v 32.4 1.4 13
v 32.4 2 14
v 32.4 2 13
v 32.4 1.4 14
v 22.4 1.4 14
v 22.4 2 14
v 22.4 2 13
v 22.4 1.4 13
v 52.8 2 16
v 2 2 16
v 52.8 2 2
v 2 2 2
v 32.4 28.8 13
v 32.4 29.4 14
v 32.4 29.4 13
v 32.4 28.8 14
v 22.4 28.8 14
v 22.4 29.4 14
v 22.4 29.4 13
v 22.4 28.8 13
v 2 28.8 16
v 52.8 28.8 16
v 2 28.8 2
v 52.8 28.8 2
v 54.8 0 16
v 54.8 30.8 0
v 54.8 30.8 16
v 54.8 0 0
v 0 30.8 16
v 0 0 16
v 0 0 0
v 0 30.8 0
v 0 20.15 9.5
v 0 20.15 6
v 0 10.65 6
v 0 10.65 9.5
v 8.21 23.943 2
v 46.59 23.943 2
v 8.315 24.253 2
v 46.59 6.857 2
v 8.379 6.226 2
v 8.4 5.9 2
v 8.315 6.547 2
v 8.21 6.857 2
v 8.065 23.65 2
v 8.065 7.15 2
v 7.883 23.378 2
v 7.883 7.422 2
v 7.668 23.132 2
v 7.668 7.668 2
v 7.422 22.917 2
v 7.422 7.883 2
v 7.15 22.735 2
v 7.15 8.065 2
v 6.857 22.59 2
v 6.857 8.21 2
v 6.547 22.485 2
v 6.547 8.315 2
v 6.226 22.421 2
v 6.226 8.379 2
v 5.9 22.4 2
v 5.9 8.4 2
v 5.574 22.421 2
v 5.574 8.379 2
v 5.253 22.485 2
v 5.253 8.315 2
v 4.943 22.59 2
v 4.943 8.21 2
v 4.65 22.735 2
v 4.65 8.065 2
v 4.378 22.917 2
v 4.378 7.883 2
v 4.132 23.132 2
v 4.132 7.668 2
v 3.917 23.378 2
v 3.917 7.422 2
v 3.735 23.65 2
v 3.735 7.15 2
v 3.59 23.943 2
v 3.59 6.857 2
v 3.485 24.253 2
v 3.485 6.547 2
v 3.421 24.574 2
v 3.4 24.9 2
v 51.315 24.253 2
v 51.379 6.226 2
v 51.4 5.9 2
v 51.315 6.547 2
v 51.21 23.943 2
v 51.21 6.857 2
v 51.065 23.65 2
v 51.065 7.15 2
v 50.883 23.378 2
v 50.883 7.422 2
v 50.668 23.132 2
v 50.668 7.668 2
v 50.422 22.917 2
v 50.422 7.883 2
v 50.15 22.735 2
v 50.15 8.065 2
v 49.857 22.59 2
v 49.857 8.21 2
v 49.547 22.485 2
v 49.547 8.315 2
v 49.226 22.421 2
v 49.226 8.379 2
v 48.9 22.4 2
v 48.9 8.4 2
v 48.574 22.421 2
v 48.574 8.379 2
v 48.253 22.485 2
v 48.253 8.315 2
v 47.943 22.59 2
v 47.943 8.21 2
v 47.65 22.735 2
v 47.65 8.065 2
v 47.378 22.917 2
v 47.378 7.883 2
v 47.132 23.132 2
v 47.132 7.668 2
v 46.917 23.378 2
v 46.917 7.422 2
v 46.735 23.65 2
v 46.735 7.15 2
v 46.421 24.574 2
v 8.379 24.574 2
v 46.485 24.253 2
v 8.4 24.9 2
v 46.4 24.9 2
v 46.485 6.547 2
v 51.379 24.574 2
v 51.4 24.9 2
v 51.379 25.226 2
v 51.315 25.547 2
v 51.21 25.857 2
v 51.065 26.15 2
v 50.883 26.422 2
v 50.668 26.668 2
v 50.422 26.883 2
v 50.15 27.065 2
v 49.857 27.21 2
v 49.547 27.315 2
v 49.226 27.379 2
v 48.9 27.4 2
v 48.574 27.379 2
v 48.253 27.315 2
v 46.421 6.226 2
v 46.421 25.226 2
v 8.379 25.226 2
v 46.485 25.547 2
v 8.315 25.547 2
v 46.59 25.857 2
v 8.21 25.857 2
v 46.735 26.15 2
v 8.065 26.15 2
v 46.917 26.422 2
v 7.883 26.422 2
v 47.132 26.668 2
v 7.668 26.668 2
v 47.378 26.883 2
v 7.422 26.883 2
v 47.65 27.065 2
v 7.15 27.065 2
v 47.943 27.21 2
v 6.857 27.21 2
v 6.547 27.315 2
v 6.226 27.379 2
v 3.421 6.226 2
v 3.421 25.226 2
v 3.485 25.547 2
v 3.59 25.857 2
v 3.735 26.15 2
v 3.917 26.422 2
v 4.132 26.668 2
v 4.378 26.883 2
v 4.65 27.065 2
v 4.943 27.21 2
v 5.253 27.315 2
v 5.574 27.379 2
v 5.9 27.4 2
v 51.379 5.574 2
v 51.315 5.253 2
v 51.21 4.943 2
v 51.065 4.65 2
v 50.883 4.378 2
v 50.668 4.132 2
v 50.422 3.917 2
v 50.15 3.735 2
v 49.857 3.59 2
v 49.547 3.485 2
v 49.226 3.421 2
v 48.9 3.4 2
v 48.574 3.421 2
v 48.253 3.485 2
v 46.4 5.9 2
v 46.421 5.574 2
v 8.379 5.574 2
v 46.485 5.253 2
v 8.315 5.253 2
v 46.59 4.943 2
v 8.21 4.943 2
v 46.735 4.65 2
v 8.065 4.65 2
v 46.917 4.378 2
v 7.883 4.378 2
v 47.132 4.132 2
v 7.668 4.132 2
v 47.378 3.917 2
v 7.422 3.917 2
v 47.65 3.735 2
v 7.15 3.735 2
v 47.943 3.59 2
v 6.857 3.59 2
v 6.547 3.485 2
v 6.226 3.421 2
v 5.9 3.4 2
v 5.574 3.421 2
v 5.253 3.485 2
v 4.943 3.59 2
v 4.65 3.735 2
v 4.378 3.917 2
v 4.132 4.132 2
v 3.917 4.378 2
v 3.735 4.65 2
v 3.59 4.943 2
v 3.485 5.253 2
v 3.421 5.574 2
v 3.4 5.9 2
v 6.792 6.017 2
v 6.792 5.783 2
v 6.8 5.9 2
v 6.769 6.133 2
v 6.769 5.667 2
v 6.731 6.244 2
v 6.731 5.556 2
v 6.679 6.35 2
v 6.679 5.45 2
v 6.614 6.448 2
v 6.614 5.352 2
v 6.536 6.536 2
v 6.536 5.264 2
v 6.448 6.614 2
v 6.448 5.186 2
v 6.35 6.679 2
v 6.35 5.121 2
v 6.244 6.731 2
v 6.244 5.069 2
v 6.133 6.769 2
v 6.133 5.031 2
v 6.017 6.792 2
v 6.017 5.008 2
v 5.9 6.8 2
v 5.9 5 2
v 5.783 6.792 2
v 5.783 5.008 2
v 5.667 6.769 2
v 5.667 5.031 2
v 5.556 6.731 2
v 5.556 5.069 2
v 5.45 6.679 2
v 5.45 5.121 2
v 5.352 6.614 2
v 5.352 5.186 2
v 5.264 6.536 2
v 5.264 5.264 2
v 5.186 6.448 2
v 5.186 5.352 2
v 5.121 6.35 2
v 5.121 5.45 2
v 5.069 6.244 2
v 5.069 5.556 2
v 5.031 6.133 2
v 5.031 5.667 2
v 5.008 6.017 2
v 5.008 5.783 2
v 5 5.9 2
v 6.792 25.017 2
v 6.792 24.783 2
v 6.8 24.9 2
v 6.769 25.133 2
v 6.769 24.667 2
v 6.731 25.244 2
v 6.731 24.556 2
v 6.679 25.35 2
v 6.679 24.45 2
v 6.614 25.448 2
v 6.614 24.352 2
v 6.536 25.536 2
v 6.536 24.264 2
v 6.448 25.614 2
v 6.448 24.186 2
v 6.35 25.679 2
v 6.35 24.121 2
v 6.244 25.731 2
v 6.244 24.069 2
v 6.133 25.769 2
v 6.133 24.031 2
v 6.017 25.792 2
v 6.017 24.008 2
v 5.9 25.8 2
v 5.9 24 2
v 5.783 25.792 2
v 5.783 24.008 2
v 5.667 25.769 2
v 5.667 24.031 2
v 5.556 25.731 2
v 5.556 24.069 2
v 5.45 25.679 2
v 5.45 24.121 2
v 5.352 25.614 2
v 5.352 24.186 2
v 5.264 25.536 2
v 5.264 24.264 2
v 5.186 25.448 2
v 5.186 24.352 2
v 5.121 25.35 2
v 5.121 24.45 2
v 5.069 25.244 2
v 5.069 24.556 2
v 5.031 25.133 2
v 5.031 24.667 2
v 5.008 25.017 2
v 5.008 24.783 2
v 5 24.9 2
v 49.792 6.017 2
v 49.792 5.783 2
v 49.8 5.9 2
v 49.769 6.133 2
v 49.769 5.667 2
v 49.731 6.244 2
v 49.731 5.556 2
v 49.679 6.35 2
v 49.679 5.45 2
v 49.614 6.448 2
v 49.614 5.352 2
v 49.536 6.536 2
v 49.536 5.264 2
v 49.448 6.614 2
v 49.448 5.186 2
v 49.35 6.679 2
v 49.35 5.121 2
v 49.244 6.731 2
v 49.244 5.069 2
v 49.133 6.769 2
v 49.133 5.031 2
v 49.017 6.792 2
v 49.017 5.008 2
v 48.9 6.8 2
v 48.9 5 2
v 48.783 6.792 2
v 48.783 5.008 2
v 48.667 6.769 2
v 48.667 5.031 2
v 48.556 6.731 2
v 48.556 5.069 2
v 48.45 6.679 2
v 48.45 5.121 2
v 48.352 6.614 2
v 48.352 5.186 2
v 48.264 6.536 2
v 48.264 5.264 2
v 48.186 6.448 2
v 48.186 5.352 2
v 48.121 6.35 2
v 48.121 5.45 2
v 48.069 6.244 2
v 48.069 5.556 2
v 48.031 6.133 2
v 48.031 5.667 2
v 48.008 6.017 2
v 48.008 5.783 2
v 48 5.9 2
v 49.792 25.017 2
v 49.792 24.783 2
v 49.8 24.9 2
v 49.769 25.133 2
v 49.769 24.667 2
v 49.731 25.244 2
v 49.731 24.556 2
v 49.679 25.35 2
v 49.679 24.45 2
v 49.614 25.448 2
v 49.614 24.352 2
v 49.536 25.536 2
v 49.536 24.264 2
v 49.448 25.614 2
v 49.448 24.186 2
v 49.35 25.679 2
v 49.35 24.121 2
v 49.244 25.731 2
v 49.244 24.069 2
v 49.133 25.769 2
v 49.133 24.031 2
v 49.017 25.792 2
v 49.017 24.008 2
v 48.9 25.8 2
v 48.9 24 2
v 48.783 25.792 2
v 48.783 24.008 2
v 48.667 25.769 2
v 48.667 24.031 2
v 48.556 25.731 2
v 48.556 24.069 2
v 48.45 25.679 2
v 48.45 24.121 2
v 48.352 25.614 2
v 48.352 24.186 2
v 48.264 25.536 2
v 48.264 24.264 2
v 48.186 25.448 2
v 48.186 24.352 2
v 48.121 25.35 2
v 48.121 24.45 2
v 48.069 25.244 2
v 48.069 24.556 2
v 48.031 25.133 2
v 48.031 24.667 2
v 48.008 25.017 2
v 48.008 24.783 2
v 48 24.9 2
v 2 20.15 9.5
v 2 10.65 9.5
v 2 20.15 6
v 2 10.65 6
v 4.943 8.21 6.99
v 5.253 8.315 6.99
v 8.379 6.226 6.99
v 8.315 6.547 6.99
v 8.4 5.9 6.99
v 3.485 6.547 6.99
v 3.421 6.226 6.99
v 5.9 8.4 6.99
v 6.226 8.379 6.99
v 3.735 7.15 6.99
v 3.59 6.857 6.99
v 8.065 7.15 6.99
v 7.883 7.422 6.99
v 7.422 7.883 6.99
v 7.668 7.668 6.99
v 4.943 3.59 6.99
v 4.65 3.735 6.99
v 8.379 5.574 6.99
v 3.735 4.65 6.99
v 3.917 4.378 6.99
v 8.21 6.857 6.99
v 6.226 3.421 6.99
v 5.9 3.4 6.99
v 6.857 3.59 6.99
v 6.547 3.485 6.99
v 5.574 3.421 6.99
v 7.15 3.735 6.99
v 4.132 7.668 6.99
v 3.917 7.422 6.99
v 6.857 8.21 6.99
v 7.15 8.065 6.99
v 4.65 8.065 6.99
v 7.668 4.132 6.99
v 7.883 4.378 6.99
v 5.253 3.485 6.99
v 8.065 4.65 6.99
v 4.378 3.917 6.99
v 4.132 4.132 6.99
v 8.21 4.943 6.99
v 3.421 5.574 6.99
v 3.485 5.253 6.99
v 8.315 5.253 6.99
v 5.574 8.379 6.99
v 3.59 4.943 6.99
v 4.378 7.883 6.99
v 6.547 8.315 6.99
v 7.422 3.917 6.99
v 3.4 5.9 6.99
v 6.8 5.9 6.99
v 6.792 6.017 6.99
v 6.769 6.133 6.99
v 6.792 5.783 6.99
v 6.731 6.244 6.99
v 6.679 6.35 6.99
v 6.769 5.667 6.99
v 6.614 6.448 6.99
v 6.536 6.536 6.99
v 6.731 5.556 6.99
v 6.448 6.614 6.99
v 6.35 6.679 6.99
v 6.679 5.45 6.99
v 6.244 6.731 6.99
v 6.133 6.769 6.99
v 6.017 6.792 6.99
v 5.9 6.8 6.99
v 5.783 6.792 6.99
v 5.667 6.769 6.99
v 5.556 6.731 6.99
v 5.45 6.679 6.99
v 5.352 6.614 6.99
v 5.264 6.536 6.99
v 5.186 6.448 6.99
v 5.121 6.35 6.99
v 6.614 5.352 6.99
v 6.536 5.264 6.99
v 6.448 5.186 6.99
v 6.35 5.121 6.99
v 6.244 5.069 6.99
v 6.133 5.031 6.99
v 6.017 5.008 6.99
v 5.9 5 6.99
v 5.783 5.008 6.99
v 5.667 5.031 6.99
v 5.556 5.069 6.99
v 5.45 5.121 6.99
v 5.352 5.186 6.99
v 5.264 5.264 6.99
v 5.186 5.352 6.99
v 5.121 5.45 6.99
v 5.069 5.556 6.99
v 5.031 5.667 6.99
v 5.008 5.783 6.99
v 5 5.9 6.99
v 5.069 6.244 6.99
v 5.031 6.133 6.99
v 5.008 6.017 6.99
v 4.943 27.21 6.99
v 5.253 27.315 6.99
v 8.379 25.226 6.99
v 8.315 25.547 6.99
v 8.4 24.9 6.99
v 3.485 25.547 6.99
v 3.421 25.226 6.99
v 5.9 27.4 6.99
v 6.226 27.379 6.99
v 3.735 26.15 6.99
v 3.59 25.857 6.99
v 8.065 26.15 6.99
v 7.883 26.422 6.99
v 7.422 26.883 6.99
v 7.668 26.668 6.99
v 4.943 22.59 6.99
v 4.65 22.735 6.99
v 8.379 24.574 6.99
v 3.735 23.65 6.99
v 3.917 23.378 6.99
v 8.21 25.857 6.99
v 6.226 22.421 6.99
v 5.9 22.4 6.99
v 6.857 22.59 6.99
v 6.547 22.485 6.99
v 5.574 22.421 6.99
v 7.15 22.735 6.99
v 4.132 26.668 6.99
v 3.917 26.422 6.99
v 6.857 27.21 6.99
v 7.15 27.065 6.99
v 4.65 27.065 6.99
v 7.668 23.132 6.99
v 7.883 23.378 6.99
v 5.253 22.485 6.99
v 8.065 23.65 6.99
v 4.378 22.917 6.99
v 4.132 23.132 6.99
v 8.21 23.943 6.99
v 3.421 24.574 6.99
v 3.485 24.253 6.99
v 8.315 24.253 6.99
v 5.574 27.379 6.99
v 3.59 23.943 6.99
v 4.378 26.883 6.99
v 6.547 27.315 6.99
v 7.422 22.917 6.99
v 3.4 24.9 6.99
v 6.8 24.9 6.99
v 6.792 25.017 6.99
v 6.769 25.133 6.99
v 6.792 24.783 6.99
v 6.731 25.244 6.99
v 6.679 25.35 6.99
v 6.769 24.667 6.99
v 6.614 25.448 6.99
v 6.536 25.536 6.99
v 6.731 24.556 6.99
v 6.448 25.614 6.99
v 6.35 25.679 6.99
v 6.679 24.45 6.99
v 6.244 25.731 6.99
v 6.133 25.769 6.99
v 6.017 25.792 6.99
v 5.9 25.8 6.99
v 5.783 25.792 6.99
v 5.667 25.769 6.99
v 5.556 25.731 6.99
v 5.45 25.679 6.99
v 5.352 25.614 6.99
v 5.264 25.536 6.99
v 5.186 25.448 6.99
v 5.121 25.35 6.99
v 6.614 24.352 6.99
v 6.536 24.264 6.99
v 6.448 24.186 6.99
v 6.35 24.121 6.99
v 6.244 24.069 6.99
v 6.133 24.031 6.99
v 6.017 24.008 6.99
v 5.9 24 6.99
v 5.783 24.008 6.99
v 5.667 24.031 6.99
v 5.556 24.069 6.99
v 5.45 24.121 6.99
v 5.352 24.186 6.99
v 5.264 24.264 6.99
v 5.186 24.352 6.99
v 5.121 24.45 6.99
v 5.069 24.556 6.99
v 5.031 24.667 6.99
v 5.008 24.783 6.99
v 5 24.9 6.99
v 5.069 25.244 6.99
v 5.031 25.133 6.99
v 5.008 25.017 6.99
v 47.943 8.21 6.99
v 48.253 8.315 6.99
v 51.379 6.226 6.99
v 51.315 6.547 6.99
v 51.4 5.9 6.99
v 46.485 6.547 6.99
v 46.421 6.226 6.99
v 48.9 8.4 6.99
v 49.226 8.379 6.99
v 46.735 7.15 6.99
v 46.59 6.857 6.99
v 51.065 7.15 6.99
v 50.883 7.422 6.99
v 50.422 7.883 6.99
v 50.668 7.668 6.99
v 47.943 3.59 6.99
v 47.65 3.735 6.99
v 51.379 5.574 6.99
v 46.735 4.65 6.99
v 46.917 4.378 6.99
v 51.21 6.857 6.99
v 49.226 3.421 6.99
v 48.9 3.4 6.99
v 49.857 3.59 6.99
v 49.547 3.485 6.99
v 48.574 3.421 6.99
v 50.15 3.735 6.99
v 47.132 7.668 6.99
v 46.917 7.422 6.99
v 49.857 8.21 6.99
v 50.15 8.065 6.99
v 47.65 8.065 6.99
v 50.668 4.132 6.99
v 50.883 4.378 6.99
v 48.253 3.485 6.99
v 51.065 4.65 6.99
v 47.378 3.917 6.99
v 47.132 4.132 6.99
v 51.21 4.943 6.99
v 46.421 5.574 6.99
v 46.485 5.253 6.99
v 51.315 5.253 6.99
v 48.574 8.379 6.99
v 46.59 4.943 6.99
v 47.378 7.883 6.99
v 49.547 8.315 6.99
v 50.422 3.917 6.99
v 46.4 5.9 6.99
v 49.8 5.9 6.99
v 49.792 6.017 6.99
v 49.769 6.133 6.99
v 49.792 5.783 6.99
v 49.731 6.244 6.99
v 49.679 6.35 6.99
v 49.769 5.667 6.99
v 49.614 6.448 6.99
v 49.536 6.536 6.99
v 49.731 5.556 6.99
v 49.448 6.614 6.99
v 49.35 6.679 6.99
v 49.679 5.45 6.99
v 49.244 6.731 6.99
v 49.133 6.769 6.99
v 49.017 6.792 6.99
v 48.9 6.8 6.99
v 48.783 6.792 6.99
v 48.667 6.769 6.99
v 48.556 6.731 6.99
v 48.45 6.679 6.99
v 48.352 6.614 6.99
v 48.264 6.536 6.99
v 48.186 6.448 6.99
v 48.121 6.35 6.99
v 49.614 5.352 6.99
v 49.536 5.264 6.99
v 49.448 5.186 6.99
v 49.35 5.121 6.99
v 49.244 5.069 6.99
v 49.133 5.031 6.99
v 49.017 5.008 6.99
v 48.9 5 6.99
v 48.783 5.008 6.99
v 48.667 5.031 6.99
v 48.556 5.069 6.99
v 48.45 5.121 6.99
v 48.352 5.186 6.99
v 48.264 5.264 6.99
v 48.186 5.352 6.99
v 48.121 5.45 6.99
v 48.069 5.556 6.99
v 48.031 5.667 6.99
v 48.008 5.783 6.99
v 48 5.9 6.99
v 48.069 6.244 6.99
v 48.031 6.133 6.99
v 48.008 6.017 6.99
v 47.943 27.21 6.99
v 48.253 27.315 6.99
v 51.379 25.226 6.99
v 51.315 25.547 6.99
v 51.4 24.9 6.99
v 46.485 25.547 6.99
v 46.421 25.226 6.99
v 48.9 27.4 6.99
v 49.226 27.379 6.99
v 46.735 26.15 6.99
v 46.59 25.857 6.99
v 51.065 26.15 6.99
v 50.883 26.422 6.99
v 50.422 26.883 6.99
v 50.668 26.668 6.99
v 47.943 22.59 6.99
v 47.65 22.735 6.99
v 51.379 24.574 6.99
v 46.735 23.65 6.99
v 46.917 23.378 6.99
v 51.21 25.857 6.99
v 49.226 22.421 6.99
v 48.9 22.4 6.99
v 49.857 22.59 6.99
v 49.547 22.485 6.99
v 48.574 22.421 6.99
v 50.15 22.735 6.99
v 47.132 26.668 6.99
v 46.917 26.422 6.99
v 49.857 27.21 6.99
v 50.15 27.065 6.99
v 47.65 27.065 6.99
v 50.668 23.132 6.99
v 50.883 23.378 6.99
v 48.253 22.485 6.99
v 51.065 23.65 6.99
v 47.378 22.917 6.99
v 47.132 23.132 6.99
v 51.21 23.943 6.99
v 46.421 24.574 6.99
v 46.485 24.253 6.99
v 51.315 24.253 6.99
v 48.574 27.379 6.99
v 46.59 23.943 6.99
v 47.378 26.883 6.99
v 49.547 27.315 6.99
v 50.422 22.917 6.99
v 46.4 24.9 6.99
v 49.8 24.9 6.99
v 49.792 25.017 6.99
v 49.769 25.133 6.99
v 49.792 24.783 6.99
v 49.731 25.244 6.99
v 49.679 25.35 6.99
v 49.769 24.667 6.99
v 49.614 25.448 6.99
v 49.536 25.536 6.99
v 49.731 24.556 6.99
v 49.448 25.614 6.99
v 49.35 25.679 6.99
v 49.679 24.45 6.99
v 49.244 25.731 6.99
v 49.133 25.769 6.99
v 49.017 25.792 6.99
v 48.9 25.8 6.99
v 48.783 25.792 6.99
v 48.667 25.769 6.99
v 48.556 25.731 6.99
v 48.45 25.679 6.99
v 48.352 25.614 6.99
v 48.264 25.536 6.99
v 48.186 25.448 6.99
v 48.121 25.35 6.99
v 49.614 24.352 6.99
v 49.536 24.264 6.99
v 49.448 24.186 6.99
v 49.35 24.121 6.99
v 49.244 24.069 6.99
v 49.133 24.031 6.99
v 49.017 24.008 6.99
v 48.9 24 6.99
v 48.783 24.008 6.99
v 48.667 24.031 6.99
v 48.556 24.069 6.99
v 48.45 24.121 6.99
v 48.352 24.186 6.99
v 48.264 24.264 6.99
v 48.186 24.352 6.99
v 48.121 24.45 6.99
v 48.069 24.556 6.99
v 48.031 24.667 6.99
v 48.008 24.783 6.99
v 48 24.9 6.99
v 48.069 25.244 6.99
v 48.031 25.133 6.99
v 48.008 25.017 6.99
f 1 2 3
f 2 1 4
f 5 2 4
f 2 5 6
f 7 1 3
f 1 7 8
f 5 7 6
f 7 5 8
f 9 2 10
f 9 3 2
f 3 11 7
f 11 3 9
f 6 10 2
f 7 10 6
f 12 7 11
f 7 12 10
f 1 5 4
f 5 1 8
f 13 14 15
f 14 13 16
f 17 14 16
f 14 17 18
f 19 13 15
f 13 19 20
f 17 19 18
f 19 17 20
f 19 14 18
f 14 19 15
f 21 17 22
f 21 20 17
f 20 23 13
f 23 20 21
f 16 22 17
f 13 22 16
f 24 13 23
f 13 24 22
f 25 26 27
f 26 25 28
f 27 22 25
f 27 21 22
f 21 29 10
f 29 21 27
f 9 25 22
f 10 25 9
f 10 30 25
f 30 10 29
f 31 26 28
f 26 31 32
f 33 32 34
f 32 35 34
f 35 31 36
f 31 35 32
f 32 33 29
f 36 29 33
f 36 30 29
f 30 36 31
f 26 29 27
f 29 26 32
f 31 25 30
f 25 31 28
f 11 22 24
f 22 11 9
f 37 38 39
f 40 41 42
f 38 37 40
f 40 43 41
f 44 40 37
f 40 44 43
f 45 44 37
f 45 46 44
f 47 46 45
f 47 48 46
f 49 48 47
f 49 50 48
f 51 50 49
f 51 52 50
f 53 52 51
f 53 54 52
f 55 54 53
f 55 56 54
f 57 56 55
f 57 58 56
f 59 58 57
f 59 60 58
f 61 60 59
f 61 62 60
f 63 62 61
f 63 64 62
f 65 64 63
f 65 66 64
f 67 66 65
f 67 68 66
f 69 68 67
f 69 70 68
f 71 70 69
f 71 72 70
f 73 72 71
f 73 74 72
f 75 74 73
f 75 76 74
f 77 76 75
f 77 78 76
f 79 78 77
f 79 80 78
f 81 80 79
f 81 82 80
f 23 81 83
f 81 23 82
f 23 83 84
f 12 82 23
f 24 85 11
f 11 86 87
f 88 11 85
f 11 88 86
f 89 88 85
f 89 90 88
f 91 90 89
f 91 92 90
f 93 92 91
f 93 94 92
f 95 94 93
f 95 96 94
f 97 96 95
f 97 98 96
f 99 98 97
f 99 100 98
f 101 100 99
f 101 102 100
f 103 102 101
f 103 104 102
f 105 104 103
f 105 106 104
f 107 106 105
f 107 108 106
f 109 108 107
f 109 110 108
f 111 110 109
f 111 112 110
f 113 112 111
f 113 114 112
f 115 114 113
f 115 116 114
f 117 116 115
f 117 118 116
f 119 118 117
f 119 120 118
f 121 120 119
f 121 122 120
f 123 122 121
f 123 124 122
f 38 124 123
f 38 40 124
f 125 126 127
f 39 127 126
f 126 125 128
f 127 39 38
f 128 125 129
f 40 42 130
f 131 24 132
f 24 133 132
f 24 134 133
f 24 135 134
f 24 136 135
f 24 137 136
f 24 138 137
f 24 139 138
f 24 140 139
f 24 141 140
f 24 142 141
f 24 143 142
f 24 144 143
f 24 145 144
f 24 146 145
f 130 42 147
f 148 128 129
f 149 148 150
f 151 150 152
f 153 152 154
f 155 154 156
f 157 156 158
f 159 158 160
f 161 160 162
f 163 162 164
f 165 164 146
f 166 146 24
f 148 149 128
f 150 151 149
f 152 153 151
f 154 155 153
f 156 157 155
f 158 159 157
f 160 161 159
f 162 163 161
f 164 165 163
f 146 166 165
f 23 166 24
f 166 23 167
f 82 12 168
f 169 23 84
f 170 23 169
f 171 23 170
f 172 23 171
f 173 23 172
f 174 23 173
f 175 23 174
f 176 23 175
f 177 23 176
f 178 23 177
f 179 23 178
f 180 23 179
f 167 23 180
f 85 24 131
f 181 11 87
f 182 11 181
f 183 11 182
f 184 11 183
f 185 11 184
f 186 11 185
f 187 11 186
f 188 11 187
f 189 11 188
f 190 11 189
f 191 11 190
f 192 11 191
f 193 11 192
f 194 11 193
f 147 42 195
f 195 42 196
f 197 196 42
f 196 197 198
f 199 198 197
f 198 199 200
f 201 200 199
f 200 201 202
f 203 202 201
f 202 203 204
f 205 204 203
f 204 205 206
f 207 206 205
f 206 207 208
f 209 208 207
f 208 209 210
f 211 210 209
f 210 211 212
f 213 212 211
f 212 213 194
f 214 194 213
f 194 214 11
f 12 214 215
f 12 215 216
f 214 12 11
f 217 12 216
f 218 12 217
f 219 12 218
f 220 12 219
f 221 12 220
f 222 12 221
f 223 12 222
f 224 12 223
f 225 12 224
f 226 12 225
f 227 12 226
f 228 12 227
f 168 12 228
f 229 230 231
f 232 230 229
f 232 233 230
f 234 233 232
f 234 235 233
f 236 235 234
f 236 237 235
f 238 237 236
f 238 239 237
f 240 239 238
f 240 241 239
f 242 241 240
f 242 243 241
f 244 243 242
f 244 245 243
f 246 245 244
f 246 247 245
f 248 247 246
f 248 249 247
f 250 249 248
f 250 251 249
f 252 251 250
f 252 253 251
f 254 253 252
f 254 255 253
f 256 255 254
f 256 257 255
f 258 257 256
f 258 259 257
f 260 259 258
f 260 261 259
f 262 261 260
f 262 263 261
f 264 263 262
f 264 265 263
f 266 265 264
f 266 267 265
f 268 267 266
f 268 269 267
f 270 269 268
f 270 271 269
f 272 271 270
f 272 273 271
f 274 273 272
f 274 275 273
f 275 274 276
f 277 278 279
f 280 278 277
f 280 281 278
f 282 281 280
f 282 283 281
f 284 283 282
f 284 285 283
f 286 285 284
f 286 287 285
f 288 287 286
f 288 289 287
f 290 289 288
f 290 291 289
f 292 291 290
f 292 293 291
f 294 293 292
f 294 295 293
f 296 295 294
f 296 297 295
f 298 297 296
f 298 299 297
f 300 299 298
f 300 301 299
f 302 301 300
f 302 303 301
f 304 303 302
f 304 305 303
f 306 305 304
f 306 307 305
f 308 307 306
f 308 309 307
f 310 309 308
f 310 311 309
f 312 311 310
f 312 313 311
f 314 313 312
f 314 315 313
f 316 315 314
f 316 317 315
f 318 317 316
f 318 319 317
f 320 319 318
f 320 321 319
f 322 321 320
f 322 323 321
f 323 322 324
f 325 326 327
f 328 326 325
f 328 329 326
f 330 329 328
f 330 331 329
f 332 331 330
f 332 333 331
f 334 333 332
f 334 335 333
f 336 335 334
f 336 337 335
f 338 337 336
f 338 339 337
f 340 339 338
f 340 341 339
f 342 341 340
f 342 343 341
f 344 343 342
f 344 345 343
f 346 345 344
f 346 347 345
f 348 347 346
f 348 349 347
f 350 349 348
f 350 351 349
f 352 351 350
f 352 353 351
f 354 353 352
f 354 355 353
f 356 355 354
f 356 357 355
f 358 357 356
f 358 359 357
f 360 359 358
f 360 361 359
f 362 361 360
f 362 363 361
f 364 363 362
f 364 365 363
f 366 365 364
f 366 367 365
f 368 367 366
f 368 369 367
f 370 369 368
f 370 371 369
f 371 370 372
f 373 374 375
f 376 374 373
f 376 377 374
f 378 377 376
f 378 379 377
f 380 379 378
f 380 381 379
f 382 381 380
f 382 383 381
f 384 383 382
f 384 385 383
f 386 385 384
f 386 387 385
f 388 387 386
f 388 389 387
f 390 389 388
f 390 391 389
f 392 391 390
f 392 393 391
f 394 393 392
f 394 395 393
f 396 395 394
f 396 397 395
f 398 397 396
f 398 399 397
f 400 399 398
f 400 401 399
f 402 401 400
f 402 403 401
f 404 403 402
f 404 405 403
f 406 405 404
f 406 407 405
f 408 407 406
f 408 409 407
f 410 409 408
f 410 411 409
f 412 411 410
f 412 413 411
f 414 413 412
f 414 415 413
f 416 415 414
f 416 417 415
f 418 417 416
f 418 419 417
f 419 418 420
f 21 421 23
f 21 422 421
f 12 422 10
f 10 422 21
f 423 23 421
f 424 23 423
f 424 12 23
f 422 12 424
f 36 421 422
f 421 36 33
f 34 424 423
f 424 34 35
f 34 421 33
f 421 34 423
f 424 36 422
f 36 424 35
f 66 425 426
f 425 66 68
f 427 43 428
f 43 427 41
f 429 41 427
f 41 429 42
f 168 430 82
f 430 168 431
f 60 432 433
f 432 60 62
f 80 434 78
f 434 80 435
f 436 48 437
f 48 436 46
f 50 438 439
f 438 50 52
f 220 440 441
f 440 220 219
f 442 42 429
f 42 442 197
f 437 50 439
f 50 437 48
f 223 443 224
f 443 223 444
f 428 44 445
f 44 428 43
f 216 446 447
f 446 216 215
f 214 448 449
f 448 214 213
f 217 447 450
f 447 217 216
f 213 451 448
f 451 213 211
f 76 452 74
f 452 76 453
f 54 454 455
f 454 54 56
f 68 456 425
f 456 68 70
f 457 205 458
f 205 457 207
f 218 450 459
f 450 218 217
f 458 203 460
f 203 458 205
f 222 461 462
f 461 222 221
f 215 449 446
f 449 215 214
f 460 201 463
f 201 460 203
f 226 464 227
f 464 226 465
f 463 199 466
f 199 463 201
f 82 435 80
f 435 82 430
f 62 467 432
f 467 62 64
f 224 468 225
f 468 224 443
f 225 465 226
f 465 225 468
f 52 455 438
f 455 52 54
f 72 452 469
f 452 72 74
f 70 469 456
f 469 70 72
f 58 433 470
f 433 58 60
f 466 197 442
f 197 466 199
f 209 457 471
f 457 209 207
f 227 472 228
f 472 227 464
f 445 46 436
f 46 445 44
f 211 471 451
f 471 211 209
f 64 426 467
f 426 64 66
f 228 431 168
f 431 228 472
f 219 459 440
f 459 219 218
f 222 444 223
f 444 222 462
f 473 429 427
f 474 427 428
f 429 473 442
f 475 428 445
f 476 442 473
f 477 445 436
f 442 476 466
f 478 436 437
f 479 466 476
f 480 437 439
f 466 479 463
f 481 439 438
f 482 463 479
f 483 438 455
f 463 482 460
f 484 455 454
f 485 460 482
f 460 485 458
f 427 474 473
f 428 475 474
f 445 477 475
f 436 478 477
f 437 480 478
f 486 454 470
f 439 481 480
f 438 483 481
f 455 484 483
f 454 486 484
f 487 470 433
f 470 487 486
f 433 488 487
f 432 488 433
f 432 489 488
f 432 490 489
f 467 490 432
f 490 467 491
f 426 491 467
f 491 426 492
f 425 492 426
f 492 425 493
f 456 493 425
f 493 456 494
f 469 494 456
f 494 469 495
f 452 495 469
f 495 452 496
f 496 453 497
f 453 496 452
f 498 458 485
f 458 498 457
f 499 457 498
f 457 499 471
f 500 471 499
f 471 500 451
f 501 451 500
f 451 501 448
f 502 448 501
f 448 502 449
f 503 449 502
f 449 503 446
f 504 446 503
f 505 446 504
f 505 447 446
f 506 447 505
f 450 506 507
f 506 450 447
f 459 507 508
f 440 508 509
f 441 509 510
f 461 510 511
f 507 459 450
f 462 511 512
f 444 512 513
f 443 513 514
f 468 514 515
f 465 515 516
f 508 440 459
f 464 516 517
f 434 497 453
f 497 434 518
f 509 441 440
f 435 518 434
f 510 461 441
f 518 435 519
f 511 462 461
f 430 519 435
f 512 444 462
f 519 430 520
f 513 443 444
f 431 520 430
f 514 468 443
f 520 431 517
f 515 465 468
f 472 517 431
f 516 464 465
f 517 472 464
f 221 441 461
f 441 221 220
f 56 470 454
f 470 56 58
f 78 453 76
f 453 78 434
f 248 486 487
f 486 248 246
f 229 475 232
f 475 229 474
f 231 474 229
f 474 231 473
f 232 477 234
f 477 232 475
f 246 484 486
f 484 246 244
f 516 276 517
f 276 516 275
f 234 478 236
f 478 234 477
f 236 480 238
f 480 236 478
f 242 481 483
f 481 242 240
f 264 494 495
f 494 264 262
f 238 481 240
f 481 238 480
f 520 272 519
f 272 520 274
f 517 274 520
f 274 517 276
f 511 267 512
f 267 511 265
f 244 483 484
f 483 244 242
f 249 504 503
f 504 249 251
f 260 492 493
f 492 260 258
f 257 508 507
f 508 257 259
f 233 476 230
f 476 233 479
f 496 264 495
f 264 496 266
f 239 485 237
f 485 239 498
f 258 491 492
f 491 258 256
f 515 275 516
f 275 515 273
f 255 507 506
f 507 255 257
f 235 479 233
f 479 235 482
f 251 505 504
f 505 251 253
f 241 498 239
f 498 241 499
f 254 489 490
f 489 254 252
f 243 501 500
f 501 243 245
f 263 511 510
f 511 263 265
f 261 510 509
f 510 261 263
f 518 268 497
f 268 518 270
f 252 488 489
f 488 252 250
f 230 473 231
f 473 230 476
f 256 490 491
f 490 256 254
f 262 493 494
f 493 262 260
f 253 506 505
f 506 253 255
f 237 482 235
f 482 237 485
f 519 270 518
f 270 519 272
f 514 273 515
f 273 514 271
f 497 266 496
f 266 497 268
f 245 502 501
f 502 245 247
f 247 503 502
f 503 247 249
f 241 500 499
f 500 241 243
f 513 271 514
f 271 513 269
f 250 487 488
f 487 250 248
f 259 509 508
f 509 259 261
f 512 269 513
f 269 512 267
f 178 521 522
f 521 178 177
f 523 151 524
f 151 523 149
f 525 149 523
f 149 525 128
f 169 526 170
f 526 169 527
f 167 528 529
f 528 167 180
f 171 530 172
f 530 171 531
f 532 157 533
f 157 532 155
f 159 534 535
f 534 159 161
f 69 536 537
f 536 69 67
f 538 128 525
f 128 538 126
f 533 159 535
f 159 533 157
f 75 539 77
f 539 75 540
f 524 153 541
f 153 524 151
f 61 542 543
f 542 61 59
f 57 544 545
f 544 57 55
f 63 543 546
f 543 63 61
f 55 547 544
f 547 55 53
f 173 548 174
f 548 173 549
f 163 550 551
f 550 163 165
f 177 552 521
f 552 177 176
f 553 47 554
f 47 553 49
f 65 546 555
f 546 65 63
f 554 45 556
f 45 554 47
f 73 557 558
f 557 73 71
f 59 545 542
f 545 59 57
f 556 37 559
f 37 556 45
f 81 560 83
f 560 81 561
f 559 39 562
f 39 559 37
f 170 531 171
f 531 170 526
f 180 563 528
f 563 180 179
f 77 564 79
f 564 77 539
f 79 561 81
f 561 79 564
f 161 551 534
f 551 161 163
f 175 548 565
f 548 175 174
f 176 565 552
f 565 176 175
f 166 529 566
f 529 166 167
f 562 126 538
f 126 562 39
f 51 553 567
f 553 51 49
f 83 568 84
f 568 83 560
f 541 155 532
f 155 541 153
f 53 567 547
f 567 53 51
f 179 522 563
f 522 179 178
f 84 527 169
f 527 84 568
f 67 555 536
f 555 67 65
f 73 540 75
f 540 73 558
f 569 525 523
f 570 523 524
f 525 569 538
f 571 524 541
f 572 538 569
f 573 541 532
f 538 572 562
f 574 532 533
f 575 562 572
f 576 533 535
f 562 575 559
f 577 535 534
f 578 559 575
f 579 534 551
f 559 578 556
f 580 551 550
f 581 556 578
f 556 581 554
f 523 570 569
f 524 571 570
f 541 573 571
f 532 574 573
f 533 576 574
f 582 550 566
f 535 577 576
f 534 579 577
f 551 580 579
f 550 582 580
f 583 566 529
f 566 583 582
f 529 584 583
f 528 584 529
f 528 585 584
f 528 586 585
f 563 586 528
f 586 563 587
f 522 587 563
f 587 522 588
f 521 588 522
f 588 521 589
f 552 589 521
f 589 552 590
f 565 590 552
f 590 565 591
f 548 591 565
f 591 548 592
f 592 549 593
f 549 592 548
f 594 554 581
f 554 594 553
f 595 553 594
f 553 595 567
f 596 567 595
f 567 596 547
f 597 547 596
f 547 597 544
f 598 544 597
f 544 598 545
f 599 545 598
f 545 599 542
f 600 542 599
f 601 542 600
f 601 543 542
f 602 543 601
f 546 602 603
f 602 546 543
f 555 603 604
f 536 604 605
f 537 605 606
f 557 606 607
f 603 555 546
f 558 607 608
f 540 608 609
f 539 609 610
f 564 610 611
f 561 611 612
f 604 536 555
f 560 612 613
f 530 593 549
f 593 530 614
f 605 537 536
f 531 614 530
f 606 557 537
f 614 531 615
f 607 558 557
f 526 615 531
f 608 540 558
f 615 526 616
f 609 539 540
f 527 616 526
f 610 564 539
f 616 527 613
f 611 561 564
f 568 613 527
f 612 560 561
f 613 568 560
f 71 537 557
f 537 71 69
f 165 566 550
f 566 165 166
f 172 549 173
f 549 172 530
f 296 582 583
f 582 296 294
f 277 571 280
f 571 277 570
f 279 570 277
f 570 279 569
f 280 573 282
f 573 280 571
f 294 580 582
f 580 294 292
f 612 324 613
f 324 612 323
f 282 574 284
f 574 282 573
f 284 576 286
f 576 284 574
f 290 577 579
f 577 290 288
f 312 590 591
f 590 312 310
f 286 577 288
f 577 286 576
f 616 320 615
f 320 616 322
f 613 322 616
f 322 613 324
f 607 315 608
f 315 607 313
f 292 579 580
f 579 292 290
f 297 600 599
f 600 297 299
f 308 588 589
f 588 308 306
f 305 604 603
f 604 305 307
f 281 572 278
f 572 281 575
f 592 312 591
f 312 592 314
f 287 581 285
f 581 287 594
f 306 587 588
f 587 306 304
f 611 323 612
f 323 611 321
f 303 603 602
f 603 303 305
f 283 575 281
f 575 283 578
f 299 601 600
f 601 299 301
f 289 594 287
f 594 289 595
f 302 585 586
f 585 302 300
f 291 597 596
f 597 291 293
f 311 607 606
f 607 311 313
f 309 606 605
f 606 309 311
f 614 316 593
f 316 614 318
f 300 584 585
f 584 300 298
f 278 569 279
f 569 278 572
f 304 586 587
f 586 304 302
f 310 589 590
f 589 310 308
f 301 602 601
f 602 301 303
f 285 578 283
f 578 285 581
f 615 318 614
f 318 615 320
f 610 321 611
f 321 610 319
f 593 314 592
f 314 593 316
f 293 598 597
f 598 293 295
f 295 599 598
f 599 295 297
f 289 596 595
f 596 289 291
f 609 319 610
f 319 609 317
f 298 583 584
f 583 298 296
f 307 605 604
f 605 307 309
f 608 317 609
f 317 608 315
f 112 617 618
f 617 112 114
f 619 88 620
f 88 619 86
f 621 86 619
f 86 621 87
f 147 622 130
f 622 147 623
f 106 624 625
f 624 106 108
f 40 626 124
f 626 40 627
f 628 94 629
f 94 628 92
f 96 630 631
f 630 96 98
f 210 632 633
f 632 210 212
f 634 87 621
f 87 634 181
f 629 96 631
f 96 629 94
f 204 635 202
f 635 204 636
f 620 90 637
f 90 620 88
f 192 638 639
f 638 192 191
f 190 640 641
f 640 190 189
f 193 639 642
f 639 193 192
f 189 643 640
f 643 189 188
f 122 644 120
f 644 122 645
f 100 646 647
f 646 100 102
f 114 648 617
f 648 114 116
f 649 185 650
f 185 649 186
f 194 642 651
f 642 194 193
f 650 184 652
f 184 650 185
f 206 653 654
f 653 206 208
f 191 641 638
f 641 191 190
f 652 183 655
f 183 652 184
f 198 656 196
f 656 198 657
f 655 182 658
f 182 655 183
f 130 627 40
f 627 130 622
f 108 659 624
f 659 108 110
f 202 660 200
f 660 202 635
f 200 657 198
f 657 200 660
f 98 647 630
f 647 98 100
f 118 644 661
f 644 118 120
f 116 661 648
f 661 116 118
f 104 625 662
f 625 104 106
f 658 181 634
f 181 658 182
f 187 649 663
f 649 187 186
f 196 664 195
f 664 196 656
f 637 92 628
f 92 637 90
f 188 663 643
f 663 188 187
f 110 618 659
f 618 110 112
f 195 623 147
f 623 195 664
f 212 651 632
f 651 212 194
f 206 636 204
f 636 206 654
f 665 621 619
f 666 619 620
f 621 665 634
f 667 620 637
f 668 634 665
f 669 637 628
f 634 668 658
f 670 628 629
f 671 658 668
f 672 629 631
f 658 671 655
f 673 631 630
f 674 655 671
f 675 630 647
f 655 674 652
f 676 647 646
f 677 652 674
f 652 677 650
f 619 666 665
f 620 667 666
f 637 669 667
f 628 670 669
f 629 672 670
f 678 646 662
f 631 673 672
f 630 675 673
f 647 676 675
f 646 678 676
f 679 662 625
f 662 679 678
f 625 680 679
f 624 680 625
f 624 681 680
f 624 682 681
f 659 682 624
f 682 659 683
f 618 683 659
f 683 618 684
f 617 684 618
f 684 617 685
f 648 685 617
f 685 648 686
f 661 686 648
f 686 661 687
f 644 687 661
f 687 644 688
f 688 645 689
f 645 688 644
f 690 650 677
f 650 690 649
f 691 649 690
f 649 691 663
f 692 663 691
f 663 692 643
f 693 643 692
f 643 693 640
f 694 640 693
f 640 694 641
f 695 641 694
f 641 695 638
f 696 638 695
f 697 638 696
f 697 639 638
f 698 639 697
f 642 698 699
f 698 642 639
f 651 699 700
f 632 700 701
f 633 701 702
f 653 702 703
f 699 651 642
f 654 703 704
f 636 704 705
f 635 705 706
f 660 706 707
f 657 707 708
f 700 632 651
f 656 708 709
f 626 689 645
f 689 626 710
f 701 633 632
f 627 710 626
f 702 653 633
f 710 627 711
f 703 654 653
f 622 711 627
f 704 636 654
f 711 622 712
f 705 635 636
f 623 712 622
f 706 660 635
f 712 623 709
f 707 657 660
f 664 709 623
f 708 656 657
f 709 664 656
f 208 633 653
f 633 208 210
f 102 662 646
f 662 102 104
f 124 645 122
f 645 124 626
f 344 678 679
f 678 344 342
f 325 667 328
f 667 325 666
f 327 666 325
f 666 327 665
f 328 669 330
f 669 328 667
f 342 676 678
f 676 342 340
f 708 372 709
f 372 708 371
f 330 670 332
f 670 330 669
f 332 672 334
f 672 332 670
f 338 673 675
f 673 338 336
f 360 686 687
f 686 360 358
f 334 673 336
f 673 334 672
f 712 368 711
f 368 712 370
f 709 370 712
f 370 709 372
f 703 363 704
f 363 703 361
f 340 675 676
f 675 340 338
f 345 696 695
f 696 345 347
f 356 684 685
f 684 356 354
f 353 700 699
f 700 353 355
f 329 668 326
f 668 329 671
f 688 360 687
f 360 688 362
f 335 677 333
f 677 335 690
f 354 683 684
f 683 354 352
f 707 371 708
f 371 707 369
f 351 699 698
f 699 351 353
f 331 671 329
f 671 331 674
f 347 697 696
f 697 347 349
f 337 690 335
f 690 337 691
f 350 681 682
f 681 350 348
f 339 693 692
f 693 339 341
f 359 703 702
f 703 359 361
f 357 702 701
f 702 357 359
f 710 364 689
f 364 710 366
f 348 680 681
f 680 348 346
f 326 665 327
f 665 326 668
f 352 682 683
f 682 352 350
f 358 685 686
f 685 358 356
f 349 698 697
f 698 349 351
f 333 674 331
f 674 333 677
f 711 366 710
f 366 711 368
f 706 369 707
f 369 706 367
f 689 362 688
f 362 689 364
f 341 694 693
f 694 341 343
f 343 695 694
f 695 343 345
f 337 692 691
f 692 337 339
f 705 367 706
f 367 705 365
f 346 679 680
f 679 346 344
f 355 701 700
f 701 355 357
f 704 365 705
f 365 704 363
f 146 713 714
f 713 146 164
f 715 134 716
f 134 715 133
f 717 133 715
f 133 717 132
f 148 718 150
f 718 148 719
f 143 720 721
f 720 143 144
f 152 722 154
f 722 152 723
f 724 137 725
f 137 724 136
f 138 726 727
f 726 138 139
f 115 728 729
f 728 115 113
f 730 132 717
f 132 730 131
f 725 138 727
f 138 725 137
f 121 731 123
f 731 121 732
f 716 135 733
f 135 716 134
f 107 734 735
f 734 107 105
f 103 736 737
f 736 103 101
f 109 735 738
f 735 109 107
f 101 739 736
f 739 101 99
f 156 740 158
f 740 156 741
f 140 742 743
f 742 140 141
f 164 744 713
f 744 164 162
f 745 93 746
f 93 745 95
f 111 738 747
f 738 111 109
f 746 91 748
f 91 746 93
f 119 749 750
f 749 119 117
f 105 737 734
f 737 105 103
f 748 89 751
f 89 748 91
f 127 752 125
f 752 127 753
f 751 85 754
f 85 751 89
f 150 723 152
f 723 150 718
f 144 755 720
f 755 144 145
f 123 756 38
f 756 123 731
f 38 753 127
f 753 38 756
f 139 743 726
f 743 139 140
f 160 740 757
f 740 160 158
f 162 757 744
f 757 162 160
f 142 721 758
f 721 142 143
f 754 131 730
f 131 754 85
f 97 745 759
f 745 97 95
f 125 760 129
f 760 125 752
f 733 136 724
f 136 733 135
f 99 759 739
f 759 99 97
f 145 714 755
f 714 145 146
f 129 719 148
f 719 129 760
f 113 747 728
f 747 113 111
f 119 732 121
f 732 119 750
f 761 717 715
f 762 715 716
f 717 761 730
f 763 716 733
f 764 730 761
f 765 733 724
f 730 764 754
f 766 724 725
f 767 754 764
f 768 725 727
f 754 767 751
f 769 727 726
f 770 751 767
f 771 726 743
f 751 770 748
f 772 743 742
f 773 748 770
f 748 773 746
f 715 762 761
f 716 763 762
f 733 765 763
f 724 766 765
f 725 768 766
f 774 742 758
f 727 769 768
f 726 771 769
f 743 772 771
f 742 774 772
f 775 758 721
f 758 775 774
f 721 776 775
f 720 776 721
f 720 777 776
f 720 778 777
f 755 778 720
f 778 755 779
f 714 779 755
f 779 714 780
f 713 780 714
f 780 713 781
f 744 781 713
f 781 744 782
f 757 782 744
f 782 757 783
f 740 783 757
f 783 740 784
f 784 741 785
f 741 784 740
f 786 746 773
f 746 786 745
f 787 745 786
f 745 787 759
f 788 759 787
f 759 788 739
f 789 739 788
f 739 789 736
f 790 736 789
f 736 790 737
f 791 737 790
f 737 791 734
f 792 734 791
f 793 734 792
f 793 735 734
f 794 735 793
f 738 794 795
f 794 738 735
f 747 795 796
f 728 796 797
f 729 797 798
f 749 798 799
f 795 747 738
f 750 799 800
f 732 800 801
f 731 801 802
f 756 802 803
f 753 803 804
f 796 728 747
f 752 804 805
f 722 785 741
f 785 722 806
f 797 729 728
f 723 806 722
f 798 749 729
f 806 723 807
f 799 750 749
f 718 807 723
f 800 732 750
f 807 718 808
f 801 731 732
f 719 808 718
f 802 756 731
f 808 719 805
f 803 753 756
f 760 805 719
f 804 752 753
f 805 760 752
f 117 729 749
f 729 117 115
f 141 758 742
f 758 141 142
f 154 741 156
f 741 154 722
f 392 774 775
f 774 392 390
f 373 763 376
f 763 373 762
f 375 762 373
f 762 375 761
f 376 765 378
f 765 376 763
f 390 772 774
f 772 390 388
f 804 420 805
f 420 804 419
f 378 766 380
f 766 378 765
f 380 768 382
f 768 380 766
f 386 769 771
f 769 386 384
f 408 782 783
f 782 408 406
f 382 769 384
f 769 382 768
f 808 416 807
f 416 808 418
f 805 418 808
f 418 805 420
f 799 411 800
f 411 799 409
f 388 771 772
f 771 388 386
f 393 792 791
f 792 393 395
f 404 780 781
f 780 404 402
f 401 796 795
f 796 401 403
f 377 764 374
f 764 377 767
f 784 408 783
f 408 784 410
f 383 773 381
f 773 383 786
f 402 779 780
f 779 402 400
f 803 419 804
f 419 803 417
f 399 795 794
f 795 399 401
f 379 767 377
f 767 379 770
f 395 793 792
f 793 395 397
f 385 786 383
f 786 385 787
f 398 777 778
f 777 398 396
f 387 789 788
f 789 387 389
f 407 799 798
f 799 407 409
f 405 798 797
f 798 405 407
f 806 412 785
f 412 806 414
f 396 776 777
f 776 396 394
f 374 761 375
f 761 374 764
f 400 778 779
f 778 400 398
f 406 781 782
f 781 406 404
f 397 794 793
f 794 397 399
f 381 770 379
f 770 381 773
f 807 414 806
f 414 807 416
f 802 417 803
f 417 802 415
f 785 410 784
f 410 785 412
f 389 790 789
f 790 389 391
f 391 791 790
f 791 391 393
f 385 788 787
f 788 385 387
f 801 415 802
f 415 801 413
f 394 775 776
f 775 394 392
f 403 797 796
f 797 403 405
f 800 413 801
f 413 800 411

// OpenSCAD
// T2 reference for the grader's self-check (grade_selftest.py): an
// enclosure for a 50 x 26 PCB. -D part="base" or "lid"; `lip_clear`,
// `wall` and `vents` are overridden to make the wrong variants.
part = "base";
pcb = [50, 26];
clear = 0.4;
wall = 2;
floor_t = 2;
height = 16;          // base, floor included
lip_clear = 0.2;
lip_t = 1.5;
lip_h = 4;
vents = 5;
$fn = 48;

cav = pcb + [2 * clear, 2 * clear];
outer = cav + [2 * wall, 2 * wall];

module base() {
    difference() {
        cube([outer.x, outer.y, height]);
        translate([wall, wall, floor_t]) cube([cav.x, cav.y, height]);
        // USB-C cutout, 9.5 x 3.5, in the -x wall.
        translate([-1, outer.y / 2 - 9.5 / 2, floor_t + 4]) cube([wall + 2, 9.5, 3.5]);
        // Snap grooves inside the long walls (not through).
        for (y = [wall - 0.6, wall + cav.y]) translate([outer.x / 2 - 5, y, height - 3]) cube([10, 0.6, 1]);
    }
    // M2 posts, 3.5 in from the PCB corners.
    for (x = [3.5, pcb.x - 3.5], y = [3.5, pcb.y - 3.5])
        translate([wall + clear + x, wall + clear + y, floor_t - 0.01]) difference() {
            cylinder(d = 5, h = 5);
            cylinder(d = 1.8, h = 6);
        }
}

module lid() {
    lip = cav - [2 * lip_clear, 2 * lip_clear];
    difference() {
        union() {
            cube([outer.x, outer.y, 2]);
            translate([(outer.x - lip.x) / 2, (outer.y - lip.y) / 2, 1.99]) difference() {
                cube([lip.x, lip.y, lip_h]);
                translate([lip_t, lip_t, -1]) cube([lip.x - 2 * lip_t, lip.y - 2 * lip_t, lip_h + 2]);
            }
            // Snap bumps on the long sides of the lip.
            for (y = [(outer.y - lip.y) / 2 - 0.4, (outer.y + lip.y) / 2])
                translate([outer.x / 2 - 4, y, 2 + lip_h - 2.5]) cube([8, 0.4, 0.8]);
        }
        for (i = [0:vents - 1])
            translate([outer.x / 2 - 10, outer.y / 2 - 9 + i * 4.5 - 1, -1]) cube([20, 2, 4]);
    }
}

if (part == "base") base(); else lid();
